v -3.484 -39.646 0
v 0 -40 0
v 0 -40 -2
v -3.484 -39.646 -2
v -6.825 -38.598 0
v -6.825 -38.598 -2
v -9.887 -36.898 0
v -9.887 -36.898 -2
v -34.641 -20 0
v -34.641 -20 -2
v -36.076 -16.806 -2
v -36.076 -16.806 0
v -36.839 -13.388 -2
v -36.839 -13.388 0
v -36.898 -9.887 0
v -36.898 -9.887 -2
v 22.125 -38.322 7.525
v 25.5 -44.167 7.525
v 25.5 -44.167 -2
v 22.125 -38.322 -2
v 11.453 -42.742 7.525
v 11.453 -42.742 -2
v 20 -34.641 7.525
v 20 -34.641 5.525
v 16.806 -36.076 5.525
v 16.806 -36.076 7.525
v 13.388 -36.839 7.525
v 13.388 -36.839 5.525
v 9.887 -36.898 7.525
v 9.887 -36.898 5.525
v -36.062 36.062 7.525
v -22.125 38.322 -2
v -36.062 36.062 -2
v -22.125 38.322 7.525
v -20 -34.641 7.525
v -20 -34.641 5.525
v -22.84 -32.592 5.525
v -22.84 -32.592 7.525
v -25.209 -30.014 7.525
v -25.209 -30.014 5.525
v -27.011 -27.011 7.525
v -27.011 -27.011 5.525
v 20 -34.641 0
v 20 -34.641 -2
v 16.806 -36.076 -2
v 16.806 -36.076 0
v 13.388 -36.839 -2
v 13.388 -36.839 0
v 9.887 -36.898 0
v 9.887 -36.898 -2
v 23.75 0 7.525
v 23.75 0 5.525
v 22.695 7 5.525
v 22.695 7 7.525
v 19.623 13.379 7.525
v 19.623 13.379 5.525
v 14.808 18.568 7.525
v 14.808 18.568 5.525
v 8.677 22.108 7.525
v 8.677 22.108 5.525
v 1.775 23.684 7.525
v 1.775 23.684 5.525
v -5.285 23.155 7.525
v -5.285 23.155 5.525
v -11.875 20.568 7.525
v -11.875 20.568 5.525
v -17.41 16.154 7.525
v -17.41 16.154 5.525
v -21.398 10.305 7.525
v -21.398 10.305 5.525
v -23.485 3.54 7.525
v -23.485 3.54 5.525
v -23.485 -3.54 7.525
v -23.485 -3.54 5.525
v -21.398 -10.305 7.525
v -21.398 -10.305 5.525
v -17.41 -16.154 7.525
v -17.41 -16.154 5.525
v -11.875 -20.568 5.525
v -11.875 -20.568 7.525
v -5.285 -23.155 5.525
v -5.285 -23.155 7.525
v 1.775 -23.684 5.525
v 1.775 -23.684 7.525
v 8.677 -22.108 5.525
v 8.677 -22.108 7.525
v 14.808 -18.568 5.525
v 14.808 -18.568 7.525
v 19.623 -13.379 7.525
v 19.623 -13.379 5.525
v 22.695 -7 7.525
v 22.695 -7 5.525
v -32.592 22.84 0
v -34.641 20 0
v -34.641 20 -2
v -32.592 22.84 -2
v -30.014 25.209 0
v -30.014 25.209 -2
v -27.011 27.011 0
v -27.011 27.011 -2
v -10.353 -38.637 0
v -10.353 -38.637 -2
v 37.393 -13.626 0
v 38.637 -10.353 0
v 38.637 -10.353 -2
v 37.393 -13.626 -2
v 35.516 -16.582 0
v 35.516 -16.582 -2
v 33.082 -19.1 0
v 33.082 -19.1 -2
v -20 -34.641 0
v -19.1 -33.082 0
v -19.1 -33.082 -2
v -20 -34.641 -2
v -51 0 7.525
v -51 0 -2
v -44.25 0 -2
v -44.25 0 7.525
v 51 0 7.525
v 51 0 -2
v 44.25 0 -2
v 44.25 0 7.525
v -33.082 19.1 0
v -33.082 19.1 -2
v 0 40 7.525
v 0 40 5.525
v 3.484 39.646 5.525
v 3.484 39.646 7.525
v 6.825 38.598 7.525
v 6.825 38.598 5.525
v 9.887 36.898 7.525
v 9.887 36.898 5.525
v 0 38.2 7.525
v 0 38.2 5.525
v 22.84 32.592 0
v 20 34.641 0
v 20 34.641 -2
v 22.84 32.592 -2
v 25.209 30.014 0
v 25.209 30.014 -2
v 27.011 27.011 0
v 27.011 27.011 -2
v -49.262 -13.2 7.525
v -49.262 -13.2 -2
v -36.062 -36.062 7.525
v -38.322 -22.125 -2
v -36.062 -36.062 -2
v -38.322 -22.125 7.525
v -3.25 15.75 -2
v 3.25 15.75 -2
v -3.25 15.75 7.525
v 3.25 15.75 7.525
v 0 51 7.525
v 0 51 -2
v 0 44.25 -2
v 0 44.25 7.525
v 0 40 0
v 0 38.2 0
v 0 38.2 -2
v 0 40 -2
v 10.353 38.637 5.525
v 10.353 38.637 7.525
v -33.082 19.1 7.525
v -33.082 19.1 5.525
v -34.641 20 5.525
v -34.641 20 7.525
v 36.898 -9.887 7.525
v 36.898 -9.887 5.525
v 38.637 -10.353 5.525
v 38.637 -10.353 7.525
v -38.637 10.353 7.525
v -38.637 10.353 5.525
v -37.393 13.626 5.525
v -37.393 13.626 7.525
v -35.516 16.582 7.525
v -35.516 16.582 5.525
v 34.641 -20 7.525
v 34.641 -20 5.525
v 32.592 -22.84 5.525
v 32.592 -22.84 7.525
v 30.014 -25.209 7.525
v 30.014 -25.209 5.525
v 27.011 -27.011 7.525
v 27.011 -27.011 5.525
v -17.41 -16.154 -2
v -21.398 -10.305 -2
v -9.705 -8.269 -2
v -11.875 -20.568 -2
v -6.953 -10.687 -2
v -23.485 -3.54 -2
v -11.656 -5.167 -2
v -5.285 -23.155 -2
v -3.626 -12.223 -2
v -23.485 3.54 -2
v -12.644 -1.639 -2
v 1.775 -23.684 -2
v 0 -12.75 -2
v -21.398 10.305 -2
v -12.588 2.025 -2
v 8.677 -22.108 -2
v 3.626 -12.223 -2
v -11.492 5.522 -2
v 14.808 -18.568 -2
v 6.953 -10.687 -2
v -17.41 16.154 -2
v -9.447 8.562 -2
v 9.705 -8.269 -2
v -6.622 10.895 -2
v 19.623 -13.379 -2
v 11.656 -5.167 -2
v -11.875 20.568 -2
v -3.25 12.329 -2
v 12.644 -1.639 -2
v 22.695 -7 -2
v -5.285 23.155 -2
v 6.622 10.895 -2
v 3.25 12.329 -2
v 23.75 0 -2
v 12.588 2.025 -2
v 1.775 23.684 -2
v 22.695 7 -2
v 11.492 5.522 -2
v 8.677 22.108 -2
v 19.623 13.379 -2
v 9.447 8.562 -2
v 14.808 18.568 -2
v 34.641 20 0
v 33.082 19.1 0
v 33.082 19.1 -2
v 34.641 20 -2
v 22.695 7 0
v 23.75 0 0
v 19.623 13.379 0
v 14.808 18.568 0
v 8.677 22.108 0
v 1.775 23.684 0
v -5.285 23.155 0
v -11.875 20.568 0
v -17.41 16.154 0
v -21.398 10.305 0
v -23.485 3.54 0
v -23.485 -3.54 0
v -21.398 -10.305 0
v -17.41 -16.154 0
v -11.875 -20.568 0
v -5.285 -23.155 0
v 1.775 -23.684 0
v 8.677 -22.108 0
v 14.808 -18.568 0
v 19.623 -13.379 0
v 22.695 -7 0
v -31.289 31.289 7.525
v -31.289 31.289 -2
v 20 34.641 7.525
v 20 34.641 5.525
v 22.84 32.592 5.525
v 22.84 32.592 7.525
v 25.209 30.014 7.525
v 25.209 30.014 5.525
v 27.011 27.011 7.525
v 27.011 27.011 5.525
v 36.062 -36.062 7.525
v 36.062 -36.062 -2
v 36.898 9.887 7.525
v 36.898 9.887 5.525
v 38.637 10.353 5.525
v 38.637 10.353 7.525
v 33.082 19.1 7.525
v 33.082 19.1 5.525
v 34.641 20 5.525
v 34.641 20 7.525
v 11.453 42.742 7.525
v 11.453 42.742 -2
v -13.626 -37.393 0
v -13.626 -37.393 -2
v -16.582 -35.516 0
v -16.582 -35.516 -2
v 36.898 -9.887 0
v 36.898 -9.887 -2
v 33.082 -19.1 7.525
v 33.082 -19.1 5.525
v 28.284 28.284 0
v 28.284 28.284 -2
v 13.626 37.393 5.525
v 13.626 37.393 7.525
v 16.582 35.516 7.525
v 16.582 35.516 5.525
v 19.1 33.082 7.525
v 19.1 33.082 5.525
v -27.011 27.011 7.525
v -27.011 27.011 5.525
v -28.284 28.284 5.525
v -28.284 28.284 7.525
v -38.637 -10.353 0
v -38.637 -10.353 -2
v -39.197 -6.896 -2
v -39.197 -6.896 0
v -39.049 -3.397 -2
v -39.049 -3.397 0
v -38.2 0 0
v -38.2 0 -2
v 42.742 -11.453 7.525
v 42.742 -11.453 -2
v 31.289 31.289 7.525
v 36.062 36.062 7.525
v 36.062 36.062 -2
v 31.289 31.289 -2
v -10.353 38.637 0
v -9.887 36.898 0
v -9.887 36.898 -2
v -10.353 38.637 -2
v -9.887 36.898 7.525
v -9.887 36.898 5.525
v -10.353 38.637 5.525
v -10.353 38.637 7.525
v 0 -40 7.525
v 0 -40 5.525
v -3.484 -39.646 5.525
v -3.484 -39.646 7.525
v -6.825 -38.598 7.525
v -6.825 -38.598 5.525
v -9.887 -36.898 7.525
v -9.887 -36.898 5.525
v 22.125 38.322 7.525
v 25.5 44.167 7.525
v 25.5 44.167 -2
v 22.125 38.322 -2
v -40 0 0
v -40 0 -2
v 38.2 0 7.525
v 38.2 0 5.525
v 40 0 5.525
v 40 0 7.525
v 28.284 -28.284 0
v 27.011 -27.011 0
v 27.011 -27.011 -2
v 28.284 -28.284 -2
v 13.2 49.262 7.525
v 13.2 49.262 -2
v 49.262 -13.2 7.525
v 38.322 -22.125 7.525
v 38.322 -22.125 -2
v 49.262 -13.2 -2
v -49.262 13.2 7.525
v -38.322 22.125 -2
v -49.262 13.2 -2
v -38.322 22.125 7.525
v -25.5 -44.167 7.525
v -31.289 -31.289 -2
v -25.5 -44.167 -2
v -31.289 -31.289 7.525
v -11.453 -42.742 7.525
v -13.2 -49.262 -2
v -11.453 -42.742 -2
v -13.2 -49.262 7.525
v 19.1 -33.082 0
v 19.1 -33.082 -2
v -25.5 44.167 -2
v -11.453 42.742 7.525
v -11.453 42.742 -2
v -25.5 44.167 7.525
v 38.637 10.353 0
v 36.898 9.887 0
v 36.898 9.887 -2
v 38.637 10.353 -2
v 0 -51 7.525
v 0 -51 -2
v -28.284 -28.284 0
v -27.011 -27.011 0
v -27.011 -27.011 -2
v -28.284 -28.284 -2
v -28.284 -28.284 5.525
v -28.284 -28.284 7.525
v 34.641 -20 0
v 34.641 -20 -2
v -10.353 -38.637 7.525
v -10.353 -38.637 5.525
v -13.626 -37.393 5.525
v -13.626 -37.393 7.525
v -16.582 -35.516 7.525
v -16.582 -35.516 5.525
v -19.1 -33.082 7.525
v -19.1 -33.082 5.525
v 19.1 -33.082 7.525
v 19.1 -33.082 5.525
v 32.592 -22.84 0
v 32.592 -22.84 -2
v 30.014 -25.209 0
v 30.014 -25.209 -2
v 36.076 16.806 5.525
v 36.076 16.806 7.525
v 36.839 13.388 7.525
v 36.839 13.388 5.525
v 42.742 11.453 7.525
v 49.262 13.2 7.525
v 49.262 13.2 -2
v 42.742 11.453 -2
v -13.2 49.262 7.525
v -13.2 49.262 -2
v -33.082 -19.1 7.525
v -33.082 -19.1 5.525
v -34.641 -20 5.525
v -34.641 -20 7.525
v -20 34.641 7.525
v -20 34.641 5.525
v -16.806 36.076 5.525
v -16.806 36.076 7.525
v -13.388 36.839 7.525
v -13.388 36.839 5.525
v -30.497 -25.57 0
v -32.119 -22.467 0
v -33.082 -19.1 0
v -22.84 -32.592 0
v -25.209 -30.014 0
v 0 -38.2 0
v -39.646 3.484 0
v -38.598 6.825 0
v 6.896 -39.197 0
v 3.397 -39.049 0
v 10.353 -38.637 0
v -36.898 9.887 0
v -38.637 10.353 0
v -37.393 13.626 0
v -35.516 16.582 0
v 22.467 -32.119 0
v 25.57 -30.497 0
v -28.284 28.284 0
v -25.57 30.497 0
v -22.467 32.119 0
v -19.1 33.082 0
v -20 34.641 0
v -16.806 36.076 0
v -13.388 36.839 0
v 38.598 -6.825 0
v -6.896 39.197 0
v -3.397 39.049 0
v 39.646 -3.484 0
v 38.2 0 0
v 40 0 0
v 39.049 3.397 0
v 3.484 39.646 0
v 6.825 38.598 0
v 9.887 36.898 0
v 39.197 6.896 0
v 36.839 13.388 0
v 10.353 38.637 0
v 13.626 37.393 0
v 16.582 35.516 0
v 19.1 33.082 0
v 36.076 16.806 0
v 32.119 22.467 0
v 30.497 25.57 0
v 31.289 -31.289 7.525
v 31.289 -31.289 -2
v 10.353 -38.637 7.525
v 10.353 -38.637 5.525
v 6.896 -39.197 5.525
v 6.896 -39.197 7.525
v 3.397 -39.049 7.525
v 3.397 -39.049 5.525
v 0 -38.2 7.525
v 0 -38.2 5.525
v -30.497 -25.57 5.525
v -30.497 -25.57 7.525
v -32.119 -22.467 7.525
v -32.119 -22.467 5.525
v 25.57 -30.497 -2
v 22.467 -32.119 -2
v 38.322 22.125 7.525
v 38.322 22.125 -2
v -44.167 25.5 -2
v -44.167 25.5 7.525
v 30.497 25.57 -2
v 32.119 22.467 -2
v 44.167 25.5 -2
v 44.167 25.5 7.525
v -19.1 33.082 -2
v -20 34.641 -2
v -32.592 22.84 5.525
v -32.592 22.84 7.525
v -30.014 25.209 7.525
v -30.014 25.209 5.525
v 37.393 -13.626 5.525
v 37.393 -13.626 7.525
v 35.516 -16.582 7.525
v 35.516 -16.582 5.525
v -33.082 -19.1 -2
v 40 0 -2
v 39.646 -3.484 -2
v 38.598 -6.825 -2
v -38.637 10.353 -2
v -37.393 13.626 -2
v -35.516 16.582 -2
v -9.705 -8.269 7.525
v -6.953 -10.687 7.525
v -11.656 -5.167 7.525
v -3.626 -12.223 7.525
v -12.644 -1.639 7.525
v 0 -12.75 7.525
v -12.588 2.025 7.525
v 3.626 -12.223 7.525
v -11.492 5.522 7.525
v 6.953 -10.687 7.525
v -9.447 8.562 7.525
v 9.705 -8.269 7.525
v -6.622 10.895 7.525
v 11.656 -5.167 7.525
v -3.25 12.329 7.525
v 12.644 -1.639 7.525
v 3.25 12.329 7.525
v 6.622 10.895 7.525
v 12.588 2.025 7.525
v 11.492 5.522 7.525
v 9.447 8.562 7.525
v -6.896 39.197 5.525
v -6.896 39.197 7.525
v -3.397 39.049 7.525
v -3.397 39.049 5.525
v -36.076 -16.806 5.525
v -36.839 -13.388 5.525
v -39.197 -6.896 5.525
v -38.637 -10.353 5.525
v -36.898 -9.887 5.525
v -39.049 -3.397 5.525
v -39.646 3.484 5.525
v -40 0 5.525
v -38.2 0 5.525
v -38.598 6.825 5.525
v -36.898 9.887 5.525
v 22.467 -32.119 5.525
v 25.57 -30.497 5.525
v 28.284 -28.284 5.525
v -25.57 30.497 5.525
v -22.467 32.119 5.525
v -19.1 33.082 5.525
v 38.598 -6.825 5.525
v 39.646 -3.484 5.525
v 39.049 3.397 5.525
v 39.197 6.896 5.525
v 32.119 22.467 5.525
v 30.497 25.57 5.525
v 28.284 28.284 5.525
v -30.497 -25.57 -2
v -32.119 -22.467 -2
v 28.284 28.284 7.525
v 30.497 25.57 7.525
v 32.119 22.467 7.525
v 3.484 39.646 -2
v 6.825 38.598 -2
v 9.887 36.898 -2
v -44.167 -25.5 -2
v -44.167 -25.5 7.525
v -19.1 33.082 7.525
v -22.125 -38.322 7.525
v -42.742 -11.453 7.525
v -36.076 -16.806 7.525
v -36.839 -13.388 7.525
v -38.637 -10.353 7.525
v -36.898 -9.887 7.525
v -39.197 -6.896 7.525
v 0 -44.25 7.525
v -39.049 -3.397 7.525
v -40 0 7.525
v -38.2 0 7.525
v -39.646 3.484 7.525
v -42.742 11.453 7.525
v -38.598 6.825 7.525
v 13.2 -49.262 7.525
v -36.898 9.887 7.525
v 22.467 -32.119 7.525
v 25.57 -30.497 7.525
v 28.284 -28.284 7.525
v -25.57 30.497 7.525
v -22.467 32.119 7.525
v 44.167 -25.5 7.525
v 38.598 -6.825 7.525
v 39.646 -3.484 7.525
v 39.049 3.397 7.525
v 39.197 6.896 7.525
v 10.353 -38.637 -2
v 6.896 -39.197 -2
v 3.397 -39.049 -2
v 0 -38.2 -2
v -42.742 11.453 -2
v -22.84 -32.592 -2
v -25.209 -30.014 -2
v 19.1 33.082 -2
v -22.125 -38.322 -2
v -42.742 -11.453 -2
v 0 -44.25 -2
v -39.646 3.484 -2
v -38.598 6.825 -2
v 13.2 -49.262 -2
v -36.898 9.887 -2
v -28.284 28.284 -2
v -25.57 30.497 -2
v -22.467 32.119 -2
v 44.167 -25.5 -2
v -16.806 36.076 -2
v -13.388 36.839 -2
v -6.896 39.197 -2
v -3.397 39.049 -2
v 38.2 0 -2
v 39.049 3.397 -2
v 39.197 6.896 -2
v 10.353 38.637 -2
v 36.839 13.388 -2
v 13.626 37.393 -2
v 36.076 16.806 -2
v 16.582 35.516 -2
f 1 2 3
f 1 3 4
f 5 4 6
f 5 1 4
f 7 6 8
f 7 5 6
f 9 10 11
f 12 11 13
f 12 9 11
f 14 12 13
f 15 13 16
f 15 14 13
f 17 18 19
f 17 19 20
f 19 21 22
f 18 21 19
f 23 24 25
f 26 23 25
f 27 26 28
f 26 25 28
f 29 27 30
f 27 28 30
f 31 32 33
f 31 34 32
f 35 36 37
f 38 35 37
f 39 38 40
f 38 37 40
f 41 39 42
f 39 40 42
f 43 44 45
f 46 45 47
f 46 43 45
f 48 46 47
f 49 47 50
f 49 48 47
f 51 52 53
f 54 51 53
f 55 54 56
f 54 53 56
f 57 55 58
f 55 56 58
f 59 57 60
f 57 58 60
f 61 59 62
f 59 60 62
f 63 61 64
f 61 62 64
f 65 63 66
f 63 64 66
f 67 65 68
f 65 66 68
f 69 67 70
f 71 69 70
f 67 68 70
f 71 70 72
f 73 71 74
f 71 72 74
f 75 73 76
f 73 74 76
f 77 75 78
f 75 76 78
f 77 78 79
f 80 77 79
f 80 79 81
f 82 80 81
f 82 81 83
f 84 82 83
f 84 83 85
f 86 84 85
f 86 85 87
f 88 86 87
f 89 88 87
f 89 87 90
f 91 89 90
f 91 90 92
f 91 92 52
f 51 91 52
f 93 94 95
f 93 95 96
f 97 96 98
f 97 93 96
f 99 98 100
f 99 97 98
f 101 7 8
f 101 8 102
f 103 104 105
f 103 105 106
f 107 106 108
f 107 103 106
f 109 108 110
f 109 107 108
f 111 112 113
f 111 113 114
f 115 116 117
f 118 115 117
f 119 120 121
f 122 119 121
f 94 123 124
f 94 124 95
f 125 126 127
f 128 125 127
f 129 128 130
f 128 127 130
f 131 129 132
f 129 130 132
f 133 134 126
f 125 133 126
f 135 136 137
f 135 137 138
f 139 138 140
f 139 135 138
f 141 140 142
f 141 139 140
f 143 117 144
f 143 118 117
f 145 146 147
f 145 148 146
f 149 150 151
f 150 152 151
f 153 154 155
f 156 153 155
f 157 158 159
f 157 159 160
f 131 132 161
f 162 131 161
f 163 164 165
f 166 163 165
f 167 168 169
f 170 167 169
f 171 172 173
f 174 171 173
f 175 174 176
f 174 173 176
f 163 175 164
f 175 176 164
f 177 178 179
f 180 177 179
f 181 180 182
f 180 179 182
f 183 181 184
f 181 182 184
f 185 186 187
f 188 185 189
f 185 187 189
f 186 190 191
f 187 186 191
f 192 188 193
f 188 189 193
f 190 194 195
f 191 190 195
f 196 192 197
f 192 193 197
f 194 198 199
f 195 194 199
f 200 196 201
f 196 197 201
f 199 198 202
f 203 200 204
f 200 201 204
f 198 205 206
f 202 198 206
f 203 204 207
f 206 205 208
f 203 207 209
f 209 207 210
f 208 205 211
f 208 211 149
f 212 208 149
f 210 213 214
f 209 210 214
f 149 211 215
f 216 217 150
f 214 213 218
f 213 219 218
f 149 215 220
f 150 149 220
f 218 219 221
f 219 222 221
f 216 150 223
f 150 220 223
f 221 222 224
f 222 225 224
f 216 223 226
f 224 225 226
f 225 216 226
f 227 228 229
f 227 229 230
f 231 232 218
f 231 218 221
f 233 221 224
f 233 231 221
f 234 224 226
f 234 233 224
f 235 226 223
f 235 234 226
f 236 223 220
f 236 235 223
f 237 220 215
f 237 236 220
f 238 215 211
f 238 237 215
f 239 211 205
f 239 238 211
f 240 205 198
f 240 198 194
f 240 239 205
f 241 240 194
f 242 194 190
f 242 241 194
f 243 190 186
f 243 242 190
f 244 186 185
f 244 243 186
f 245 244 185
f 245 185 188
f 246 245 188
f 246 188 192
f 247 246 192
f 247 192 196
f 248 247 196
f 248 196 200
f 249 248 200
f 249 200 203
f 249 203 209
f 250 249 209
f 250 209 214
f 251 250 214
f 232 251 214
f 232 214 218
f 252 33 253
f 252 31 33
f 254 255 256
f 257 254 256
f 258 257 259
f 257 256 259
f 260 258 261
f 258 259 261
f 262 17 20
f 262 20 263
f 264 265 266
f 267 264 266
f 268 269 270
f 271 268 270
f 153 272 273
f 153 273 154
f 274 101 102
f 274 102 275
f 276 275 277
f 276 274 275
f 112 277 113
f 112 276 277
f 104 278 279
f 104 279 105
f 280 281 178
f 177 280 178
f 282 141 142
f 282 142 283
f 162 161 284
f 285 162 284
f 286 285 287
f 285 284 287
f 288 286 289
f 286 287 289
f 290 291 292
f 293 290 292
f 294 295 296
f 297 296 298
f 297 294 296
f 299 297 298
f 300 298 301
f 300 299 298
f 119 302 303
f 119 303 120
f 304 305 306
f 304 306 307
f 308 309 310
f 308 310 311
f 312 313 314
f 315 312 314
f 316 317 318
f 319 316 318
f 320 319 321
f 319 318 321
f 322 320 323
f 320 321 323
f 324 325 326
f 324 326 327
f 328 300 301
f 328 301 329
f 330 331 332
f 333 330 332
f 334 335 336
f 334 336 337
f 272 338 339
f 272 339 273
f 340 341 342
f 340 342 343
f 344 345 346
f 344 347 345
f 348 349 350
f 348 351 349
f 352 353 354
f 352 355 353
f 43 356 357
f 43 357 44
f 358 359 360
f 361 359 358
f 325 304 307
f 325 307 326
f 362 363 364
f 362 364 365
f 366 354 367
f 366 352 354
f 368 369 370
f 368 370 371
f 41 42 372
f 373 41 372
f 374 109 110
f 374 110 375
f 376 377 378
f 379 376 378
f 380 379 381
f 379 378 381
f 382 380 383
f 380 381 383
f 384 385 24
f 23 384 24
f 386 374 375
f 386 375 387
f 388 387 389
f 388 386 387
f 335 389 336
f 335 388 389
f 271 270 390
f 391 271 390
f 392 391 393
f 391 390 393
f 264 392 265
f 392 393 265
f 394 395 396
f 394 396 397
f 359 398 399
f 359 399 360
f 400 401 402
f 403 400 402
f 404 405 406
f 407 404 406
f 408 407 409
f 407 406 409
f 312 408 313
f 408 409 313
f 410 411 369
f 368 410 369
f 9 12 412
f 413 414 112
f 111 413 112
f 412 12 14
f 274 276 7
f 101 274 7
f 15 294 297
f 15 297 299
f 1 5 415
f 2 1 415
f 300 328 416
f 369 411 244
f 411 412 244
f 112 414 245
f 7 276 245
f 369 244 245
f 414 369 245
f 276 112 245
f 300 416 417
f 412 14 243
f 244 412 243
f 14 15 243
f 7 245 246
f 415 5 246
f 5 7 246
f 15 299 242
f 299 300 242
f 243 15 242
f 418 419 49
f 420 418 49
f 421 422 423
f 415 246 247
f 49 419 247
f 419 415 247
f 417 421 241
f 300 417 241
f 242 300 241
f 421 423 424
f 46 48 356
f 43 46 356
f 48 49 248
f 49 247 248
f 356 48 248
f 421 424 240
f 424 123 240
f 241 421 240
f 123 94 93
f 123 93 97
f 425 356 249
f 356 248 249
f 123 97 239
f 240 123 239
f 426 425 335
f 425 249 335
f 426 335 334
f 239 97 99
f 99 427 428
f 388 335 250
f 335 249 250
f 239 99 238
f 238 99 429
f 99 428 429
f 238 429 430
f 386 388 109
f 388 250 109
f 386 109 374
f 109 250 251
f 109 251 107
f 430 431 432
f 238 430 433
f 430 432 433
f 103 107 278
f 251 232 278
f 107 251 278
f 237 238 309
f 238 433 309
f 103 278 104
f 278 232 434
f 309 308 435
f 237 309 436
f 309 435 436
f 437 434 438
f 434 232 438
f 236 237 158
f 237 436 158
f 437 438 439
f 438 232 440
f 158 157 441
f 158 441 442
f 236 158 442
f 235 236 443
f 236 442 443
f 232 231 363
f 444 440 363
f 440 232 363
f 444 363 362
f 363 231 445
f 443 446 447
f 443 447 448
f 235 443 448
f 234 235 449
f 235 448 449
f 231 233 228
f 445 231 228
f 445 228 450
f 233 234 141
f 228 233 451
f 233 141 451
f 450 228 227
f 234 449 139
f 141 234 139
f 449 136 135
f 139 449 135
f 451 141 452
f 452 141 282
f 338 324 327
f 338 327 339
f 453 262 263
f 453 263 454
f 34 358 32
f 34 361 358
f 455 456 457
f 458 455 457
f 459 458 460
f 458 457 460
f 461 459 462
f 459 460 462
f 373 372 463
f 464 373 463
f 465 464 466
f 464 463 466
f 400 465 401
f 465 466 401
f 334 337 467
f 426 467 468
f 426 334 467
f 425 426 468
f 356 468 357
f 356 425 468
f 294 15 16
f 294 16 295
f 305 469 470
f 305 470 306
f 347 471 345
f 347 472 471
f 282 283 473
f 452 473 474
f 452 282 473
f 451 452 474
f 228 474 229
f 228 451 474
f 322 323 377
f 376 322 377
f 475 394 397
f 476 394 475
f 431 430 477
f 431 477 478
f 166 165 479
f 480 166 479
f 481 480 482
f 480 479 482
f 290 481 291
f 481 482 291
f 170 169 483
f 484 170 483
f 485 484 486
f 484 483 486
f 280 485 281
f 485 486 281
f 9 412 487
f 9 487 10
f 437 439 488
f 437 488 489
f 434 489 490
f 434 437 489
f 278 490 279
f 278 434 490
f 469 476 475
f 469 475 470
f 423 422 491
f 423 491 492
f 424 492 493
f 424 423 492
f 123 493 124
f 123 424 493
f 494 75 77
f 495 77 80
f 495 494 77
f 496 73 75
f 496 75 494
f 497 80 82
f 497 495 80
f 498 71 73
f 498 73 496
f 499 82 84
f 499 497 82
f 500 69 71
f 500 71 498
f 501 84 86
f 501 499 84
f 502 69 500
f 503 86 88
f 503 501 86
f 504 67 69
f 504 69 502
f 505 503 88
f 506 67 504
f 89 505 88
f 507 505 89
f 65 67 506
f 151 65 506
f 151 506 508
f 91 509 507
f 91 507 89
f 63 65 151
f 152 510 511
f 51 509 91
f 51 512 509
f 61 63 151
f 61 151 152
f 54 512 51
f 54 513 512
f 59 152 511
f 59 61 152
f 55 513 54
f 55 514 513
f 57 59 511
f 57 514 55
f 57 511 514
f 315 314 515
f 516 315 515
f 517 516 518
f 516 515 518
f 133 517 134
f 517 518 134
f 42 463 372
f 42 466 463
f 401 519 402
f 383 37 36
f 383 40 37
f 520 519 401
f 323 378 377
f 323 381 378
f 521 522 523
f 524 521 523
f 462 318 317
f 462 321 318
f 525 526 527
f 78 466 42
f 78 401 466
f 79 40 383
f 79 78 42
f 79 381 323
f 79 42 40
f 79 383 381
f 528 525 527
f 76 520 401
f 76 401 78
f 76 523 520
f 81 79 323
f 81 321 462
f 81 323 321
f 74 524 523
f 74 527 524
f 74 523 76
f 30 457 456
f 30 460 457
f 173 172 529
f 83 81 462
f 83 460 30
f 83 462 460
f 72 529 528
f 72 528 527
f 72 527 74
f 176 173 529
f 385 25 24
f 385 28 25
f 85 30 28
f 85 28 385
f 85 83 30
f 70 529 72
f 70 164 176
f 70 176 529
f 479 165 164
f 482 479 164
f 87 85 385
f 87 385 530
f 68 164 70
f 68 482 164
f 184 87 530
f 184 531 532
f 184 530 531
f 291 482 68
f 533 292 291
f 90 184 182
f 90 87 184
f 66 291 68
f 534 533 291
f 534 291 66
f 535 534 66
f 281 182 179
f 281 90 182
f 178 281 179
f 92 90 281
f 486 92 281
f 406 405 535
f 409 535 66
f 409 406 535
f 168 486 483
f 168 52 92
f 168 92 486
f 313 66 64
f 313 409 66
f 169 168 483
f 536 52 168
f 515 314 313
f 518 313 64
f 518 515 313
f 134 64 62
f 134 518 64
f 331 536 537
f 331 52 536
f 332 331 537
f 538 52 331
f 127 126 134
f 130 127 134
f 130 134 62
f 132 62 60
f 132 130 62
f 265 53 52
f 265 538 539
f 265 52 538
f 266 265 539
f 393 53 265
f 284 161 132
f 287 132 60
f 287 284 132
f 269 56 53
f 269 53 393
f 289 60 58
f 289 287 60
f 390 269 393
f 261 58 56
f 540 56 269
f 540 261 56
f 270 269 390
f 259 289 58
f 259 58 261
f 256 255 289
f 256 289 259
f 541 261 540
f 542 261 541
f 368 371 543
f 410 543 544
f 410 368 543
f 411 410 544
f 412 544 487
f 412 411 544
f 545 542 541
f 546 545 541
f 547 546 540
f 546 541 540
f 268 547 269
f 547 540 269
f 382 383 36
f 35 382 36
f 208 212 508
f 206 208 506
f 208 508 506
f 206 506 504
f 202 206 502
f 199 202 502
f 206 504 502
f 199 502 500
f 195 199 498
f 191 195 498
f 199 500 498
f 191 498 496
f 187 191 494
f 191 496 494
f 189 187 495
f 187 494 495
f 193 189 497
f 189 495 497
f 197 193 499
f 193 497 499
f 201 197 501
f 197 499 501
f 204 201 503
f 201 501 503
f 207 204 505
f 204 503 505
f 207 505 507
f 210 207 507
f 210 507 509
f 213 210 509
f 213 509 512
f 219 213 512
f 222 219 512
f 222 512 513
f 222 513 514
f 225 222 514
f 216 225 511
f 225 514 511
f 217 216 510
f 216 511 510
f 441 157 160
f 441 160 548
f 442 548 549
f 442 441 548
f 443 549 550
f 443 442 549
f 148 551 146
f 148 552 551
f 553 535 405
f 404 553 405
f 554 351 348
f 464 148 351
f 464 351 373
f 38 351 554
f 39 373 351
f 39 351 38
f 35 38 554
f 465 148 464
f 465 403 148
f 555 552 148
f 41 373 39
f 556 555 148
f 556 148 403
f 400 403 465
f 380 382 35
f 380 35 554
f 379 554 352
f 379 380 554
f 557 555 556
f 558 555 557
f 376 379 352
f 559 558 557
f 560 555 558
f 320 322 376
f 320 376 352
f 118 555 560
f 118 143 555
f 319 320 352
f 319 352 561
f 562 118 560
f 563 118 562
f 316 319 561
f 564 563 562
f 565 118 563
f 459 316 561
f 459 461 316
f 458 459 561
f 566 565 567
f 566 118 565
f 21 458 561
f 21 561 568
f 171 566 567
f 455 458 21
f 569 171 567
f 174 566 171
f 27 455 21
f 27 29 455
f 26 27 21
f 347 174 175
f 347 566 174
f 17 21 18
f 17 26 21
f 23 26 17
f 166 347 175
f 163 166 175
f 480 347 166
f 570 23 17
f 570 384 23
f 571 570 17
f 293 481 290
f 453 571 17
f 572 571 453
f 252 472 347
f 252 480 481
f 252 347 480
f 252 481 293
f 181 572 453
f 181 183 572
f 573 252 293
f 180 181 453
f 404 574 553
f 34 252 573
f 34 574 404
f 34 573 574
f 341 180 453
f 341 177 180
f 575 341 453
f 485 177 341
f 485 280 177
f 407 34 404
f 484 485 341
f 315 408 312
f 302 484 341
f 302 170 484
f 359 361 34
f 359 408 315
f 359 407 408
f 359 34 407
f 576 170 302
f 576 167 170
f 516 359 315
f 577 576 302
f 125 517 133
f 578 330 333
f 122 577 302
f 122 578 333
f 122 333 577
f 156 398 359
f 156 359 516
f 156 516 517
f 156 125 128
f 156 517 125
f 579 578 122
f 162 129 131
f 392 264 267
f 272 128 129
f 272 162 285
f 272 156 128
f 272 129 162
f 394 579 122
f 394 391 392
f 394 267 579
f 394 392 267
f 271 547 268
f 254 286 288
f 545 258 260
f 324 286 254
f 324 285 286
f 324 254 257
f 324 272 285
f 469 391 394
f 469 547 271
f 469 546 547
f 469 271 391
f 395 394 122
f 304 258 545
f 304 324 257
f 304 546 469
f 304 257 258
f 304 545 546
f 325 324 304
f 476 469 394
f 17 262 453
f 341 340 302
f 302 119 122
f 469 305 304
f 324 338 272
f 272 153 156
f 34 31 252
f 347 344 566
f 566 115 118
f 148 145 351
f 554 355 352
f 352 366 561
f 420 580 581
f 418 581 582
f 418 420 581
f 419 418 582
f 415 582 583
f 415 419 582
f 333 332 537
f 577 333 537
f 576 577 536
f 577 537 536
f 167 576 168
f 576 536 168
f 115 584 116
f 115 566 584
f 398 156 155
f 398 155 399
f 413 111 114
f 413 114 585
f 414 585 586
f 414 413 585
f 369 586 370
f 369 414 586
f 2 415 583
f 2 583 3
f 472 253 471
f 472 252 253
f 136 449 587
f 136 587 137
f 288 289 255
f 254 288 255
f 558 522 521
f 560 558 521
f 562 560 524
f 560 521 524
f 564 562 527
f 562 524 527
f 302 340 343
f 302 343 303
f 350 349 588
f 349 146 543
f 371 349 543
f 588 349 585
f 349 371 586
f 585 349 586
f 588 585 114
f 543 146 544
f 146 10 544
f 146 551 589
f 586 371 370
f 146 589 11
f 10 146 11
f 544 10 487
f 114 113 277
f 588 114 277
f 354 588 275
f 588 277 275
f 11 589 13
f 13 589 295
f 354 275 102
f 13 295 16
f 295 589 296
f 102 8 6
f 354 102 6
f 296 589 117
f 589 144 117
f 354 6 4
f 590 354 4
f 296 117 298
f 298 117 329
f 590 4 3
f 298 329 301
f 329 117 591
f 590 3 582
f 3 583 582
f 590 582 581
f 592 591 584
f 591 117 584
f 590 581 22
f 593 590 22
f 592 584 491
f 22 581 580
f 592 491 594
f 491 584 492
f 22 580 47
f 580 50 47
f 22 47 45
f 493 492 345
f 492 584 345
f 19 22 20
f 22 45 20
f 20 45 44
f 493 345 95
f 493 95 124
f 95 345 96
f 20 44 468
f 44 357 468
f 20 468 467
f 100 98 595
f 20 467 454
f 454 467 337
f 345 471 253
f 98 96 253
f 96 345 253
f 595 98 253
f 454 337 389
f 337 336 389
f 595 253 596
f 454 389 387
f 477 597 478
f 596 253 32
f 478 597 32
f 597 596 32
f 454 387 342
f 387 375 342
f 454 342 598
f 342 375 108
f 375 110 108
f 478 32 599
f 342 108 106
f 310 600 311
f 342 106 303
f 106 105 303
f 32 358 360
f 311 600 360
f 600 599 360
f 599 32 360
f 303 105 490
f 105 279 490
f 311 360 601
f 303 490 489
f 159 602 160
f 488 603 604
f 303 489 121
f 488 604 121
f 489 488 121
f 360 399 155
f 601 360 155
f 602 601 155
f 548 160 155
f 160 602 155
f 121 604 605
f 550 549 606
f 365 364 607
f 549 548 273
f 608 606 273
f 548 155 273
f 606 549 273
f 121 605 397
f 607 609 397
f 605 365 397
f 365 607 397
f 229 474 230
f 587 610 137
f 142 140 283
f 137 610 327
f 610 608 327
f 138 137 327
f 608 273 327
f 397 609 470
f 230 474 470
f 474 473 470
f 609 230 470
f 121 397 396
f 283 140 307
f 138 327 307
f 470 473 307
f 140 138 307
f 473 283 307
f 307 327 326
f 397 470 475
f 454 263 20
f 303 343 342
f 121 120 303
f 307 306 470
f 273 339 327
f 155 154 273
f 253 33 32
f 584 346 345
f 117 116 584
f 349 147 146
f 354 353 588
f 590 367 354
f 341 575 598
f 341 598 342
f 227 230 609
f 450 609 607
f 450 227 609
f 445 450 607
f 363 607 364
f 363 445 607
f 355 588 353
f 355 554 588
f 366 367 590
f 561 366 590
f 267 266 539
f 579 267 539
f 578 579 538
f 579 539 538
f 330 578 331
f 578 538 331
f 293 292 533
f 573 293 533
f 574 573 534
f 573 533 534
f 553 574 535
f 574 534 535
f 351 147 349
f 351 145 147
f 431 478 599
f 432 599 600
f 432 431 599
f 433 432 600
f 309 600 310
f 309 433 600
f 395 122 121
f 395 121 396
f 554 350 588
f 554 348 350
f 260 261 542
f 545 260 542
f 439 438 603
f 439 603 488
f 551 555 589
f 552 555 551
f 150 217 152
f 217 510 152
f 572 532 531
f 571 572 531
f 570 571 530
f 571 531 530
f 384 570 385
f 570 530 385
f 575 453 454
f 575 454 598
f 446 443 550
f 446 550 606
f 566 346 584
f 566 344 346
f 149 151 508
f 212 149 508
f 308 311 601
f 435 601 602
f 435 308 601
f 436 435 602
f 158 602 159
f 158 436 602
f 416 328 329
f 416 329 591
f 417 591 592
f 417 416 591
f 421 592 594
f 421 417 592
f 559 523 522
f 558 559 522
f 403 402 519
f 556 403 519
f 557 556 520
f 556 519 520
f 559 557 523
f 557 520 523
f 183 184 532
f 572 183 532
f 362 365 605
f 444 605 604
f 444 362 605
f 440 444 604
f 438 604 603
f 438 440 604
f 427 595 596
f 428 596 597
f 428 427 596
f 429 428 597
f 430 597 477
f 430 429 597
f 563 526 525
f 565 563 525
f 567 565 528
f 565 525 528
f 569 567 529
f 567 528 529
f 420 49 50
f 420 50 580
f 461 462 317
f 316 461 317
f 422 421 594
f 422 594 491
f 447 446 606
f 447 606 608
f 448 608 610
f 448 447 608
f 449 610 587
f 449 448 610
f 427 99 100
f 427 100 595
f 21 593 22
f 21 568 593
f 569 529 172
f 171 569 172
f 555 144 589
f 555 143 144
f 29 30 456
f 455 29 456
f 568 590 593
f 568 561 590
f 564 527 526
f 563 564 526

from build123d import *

# Parameters (mm, degrees)
CROQUIS1_R                   = 23.75
CROQUIS1_R_2                 = 40
SALIENTE_EXTRUIR1_DEPTH      = 5.525
CROQUIS3_R                   = 23.75
SALIENTE_EXTRUIR3_DEPTH      = 4.7625
SALIENTE_EXTRUIR3_DEPTH_BACK = 4.7625
SALIENTE_EXTRUIR9_DEPTH      = 4.7625
SALIENTE_EXTRUIR9_DEPTH_BACK = 4.7625


with BuildPart() as part:
    # Croquis1 → Saliente-Extruir1 (new body)
    with BuildSketch(Plane.XY):
        Circle(CROQUIS1_R)
        with BuildLine():
            ThreePointArc((-3.25, 12.328828006), (0, -12.75), (3.25, 12.328828006))
            Line((3.25, 12.328828006), (3.25, 15.75))
            Line((3.25, 15.75), (-3.25, 15.75))
            Line((-3.25, 15.75), (-3.25, 12.328828006))
        make_face(mode=Mode.SUBTRACT)
        Circle(CROQUIS1_R_2)
        Circle(CROQUIS1_R, mode=Mode.SUBTRACT)
    extrude(amount=SALIENTE_EXTRUIR1_DEPTH)

    # Croquis3 → Saliente-Extruir3 (add, two sides)
    with BuildSketch(Plane.XY.offset(2.7625)) as saliente_extruir3_sk:
        Circle(CROQUIS3_R)
        with BuildLine():
            Line((-3.25, 15.75), (-3.25, 12.328828006))
            ThreePointArc((-3.25, 12.328828006), (0, -12.75), (3.25, 12.328828006))
            Line((3.25, 12.328828006), (3.25, 15.75))
            Line((3.25, 15.75), (-3.25, 15.75))
        make_face(mode=Mode.SUBTRACT)
    extrude(amount=SALIENTE_EXTRUIR3_DEPTH)
    extrude(saliente_extruir3_sk.sketch, amount=-SALIENTE_EXTRUIR3_DEPTH_BACK)

    # Croquis5 → Saliente-Extruir9 (add, two sides)
    with BuildSketch(Plane.XY.offset(2.7625)) as saliente_extruir9_sk:
        Polygon((11.452742746, -42.742217813), (25.5, -44.167295593), (22.125, -38.321624117), (36.062445841, -36.062445841), (31.289475068, -31.289475068), (44.167295593, -25.5), (38.321624117, -22.125), (49.262217141, -13.1997713), (42.742217813, -11.452742746), (51, 0), (44.25, 0), (49.262217141, 13.1997713), (42.742217813, 11.452742746), (44.167295593, 25.5), (38.321624117, 22.125), (36.062445841, 36.062445841), (31.289475068, 31.289475068), (25.5, 44.167295593), (22.125, 38.321624117), (13.1997713, 49.262217141), (11.452742746, 42.742217813), (0, 51), (0, 44.25), (-13.1997713, 49.262217141), (-11.452742746, 42.742217813), (-25.5, 44.167295593), (-22.125, 38.321624117), (-36.062445841, 36.062445841), (-31.289475068, 31.289475068), (-44.167295593, 25.5), (-38.321624117, 22.125), (-49.262217141, 13.1997713), (-42.742217813, 11.452742746), (-51, 0), (-44.25, 0), (-49.262217141, -13.1997713), (-42.742217813, -11.452742746), (-44.167295593, -25.5), (-38.321624117, -22.125), (-36.062445841, -36.062445841), (-31.289475068, -31.289475068), (-25.5, -44.167295593), (-22.125, -38.321624117), (-13.1997713, -49.262217141), (-11.452742746, -42.742217813), (0, -51), (0, -44.25), (13.1997713, -49.262217141), align=None)
        with BuildLine():
            Line((0, 38.2), (0, 40))
            ThreePointArc((0, 40), (5.180991094, 39.20639841), (9.886887523, 36.898366564))
            Line((9.886887523, 36.898366564), (10.352761804, 38.637033052))
            ThreePointArc((10.352761804, 38.637033052), (15.151815702, 36.529533612), (19.1, 33.082170425))
            Line((19.1, 33.082170425), (20, 34.641016151))
            ThreePointArc((20, 34.641016151), (24.090069109, 31.363241467), (27.011479041, 27.011479041))
            Line((27.011479041, 27.011479041), (28.284271247, 28.284271247))
            ThreePointArc((28.284271247, 28.284271247), (31.386624117, 24.059596246), (33.082170425, 19.1))
            Line((33.082170425, 19.1), (34.641016151, 20))
            ThreePointArc((34.641016151, 20), (36.544232561, 15.116329301), (36.898366564, 9.886887523))
            Line((36.898366564, 9.886887523), (38.637033052, 10.352761804))
            ThreePointArc((38.637033052, 10.352761804), (39.211411947, 5.142909495), (38.2, 0))
            Line((38.2, 0), (40, 0))
            ThreePointArc((40, 0), (39.20639841, -5.180991094), (36.898366564, -9.886887523))
            Line((36.898366564, -9.886887523), (38.637033052, -10.352761804))
            ThreePointArc((38.637033052, -10.352761804), (36.529533612, -15.151815702), (33.082170425, -19.1))
            Line((33.082170425, -19.1), (34.641016151, -20))
            ThreePointArc((34.641016151, -20), (31.363241467, -24.090069109), (27.011479041, -27.011479041))
            Line((27.011479041, -27.011479041), (28.284271247, -28.284271247))
            ThreePointArc((28.284271247, -28.284271247), (24.059596246, -31.386624117), (19.1, -33.082170425))
            Line((19.1, -33.082170425), (20, -34.641016151))
            ThreePointArc((20, -34.641016151), (15.116329301, -36.544232561), (9.886887523, -36.898366564))
            Line((9.886887523, -36.898366564), (10.352761804, -38.637033052))
            ThreePointArc((10.352761804, -38.637033052), (5.142909495, -39.211411947), (0, -38.2))
            Line((0, -38.2), (0, -40))
            ThreePointArc((0, -40), (-5.180991094, -39.20639841), (-9.886887523, -36.898366564))
            Line((-9.886887523, -36.898366564), (-10.352761804, -38.637033052))
            ThreePointArc((-10.352761804, -38.637033052), (-15.151815702, -36.529533612), (-19.1, -33.082170425))
            Line((-19.1, -33.082170425), (-20, -34.641016151))
            ThreePointArc((-20, -34.641016151), (-24.090069109, -31.363241467), (-27.011479041, -27.011479041))
            Line((-27.011479041, -27.011479041), (-28.284271247, -28.284271247))
            ThreePointArc((-28.284271247, -28.284271247), (-31.386624117, -24.059596246), (-33.082170425, -19.1))
            Line((-33.082170425, -19.1), (-34.641016151, -20))
            ThreePointArc((-34.641016151, -20), (-36.544232561, -15.116329301), (-36.898366564, -9.886887523))
            Line((-36.898366564, -9.886887523), (-38.637033052, -10.352761804))
            ThreePointArc((-38.637033052, -10.352761804), (-39.211411947, -5.142909495), (-38.2, 0))
            Line((-38.2, 0), (-40, 0))
            ThreePointArc((-40, 0), (-39.20639841, 5.180991094), (-36.898366564, 9.886887523))
            Line((-36.898366564, 9.886887523), (-38.637033052, 10.352761804))
            ThreePointArc((-38.637033052, 10.352761804), (-36.529533612, 15.151815702), (-33.082170425, 19.1))
            Line((-33.082170425, 19.1), (-34.641016151, 20))
            ThreePointArc((-34.641016151, 20), (-31.363241467, 24.090069109), (-27.011479041, 27.011479041))
            Line((-27.011479041, 27.011479041), (-28.284271247, 28.284271247))
            ThreePointArc((-28.284271247, 28.284271247), (-24.059596246, 31.386624117), (-19.1, 33.082170425))
            Line((-19.1, 33.082170425), (-20, 34.641016151))
            ThreePointArc((-20, 34.641016151), (-15.116329301, 36.544232561), (-9.886887523, 36.898366564))
            Line((-9.886887523, 36.898366564), (-10.352761804, 38.637033052))
            ThreePointArc((-10.352761804, 38.637033052), (-5.142909495, 39.211411947), (0, 38.2))
        make_face(mode=Mode.SUBTRACT)
    extrude(amount=SALIENTE_EXTRUIR9_DEPTH)
    extrude(saliente_extruir9_sk.sketch, amount=-SALIENTE_EXTRUIR9_DEPTH_BACK)


solid = part.part
